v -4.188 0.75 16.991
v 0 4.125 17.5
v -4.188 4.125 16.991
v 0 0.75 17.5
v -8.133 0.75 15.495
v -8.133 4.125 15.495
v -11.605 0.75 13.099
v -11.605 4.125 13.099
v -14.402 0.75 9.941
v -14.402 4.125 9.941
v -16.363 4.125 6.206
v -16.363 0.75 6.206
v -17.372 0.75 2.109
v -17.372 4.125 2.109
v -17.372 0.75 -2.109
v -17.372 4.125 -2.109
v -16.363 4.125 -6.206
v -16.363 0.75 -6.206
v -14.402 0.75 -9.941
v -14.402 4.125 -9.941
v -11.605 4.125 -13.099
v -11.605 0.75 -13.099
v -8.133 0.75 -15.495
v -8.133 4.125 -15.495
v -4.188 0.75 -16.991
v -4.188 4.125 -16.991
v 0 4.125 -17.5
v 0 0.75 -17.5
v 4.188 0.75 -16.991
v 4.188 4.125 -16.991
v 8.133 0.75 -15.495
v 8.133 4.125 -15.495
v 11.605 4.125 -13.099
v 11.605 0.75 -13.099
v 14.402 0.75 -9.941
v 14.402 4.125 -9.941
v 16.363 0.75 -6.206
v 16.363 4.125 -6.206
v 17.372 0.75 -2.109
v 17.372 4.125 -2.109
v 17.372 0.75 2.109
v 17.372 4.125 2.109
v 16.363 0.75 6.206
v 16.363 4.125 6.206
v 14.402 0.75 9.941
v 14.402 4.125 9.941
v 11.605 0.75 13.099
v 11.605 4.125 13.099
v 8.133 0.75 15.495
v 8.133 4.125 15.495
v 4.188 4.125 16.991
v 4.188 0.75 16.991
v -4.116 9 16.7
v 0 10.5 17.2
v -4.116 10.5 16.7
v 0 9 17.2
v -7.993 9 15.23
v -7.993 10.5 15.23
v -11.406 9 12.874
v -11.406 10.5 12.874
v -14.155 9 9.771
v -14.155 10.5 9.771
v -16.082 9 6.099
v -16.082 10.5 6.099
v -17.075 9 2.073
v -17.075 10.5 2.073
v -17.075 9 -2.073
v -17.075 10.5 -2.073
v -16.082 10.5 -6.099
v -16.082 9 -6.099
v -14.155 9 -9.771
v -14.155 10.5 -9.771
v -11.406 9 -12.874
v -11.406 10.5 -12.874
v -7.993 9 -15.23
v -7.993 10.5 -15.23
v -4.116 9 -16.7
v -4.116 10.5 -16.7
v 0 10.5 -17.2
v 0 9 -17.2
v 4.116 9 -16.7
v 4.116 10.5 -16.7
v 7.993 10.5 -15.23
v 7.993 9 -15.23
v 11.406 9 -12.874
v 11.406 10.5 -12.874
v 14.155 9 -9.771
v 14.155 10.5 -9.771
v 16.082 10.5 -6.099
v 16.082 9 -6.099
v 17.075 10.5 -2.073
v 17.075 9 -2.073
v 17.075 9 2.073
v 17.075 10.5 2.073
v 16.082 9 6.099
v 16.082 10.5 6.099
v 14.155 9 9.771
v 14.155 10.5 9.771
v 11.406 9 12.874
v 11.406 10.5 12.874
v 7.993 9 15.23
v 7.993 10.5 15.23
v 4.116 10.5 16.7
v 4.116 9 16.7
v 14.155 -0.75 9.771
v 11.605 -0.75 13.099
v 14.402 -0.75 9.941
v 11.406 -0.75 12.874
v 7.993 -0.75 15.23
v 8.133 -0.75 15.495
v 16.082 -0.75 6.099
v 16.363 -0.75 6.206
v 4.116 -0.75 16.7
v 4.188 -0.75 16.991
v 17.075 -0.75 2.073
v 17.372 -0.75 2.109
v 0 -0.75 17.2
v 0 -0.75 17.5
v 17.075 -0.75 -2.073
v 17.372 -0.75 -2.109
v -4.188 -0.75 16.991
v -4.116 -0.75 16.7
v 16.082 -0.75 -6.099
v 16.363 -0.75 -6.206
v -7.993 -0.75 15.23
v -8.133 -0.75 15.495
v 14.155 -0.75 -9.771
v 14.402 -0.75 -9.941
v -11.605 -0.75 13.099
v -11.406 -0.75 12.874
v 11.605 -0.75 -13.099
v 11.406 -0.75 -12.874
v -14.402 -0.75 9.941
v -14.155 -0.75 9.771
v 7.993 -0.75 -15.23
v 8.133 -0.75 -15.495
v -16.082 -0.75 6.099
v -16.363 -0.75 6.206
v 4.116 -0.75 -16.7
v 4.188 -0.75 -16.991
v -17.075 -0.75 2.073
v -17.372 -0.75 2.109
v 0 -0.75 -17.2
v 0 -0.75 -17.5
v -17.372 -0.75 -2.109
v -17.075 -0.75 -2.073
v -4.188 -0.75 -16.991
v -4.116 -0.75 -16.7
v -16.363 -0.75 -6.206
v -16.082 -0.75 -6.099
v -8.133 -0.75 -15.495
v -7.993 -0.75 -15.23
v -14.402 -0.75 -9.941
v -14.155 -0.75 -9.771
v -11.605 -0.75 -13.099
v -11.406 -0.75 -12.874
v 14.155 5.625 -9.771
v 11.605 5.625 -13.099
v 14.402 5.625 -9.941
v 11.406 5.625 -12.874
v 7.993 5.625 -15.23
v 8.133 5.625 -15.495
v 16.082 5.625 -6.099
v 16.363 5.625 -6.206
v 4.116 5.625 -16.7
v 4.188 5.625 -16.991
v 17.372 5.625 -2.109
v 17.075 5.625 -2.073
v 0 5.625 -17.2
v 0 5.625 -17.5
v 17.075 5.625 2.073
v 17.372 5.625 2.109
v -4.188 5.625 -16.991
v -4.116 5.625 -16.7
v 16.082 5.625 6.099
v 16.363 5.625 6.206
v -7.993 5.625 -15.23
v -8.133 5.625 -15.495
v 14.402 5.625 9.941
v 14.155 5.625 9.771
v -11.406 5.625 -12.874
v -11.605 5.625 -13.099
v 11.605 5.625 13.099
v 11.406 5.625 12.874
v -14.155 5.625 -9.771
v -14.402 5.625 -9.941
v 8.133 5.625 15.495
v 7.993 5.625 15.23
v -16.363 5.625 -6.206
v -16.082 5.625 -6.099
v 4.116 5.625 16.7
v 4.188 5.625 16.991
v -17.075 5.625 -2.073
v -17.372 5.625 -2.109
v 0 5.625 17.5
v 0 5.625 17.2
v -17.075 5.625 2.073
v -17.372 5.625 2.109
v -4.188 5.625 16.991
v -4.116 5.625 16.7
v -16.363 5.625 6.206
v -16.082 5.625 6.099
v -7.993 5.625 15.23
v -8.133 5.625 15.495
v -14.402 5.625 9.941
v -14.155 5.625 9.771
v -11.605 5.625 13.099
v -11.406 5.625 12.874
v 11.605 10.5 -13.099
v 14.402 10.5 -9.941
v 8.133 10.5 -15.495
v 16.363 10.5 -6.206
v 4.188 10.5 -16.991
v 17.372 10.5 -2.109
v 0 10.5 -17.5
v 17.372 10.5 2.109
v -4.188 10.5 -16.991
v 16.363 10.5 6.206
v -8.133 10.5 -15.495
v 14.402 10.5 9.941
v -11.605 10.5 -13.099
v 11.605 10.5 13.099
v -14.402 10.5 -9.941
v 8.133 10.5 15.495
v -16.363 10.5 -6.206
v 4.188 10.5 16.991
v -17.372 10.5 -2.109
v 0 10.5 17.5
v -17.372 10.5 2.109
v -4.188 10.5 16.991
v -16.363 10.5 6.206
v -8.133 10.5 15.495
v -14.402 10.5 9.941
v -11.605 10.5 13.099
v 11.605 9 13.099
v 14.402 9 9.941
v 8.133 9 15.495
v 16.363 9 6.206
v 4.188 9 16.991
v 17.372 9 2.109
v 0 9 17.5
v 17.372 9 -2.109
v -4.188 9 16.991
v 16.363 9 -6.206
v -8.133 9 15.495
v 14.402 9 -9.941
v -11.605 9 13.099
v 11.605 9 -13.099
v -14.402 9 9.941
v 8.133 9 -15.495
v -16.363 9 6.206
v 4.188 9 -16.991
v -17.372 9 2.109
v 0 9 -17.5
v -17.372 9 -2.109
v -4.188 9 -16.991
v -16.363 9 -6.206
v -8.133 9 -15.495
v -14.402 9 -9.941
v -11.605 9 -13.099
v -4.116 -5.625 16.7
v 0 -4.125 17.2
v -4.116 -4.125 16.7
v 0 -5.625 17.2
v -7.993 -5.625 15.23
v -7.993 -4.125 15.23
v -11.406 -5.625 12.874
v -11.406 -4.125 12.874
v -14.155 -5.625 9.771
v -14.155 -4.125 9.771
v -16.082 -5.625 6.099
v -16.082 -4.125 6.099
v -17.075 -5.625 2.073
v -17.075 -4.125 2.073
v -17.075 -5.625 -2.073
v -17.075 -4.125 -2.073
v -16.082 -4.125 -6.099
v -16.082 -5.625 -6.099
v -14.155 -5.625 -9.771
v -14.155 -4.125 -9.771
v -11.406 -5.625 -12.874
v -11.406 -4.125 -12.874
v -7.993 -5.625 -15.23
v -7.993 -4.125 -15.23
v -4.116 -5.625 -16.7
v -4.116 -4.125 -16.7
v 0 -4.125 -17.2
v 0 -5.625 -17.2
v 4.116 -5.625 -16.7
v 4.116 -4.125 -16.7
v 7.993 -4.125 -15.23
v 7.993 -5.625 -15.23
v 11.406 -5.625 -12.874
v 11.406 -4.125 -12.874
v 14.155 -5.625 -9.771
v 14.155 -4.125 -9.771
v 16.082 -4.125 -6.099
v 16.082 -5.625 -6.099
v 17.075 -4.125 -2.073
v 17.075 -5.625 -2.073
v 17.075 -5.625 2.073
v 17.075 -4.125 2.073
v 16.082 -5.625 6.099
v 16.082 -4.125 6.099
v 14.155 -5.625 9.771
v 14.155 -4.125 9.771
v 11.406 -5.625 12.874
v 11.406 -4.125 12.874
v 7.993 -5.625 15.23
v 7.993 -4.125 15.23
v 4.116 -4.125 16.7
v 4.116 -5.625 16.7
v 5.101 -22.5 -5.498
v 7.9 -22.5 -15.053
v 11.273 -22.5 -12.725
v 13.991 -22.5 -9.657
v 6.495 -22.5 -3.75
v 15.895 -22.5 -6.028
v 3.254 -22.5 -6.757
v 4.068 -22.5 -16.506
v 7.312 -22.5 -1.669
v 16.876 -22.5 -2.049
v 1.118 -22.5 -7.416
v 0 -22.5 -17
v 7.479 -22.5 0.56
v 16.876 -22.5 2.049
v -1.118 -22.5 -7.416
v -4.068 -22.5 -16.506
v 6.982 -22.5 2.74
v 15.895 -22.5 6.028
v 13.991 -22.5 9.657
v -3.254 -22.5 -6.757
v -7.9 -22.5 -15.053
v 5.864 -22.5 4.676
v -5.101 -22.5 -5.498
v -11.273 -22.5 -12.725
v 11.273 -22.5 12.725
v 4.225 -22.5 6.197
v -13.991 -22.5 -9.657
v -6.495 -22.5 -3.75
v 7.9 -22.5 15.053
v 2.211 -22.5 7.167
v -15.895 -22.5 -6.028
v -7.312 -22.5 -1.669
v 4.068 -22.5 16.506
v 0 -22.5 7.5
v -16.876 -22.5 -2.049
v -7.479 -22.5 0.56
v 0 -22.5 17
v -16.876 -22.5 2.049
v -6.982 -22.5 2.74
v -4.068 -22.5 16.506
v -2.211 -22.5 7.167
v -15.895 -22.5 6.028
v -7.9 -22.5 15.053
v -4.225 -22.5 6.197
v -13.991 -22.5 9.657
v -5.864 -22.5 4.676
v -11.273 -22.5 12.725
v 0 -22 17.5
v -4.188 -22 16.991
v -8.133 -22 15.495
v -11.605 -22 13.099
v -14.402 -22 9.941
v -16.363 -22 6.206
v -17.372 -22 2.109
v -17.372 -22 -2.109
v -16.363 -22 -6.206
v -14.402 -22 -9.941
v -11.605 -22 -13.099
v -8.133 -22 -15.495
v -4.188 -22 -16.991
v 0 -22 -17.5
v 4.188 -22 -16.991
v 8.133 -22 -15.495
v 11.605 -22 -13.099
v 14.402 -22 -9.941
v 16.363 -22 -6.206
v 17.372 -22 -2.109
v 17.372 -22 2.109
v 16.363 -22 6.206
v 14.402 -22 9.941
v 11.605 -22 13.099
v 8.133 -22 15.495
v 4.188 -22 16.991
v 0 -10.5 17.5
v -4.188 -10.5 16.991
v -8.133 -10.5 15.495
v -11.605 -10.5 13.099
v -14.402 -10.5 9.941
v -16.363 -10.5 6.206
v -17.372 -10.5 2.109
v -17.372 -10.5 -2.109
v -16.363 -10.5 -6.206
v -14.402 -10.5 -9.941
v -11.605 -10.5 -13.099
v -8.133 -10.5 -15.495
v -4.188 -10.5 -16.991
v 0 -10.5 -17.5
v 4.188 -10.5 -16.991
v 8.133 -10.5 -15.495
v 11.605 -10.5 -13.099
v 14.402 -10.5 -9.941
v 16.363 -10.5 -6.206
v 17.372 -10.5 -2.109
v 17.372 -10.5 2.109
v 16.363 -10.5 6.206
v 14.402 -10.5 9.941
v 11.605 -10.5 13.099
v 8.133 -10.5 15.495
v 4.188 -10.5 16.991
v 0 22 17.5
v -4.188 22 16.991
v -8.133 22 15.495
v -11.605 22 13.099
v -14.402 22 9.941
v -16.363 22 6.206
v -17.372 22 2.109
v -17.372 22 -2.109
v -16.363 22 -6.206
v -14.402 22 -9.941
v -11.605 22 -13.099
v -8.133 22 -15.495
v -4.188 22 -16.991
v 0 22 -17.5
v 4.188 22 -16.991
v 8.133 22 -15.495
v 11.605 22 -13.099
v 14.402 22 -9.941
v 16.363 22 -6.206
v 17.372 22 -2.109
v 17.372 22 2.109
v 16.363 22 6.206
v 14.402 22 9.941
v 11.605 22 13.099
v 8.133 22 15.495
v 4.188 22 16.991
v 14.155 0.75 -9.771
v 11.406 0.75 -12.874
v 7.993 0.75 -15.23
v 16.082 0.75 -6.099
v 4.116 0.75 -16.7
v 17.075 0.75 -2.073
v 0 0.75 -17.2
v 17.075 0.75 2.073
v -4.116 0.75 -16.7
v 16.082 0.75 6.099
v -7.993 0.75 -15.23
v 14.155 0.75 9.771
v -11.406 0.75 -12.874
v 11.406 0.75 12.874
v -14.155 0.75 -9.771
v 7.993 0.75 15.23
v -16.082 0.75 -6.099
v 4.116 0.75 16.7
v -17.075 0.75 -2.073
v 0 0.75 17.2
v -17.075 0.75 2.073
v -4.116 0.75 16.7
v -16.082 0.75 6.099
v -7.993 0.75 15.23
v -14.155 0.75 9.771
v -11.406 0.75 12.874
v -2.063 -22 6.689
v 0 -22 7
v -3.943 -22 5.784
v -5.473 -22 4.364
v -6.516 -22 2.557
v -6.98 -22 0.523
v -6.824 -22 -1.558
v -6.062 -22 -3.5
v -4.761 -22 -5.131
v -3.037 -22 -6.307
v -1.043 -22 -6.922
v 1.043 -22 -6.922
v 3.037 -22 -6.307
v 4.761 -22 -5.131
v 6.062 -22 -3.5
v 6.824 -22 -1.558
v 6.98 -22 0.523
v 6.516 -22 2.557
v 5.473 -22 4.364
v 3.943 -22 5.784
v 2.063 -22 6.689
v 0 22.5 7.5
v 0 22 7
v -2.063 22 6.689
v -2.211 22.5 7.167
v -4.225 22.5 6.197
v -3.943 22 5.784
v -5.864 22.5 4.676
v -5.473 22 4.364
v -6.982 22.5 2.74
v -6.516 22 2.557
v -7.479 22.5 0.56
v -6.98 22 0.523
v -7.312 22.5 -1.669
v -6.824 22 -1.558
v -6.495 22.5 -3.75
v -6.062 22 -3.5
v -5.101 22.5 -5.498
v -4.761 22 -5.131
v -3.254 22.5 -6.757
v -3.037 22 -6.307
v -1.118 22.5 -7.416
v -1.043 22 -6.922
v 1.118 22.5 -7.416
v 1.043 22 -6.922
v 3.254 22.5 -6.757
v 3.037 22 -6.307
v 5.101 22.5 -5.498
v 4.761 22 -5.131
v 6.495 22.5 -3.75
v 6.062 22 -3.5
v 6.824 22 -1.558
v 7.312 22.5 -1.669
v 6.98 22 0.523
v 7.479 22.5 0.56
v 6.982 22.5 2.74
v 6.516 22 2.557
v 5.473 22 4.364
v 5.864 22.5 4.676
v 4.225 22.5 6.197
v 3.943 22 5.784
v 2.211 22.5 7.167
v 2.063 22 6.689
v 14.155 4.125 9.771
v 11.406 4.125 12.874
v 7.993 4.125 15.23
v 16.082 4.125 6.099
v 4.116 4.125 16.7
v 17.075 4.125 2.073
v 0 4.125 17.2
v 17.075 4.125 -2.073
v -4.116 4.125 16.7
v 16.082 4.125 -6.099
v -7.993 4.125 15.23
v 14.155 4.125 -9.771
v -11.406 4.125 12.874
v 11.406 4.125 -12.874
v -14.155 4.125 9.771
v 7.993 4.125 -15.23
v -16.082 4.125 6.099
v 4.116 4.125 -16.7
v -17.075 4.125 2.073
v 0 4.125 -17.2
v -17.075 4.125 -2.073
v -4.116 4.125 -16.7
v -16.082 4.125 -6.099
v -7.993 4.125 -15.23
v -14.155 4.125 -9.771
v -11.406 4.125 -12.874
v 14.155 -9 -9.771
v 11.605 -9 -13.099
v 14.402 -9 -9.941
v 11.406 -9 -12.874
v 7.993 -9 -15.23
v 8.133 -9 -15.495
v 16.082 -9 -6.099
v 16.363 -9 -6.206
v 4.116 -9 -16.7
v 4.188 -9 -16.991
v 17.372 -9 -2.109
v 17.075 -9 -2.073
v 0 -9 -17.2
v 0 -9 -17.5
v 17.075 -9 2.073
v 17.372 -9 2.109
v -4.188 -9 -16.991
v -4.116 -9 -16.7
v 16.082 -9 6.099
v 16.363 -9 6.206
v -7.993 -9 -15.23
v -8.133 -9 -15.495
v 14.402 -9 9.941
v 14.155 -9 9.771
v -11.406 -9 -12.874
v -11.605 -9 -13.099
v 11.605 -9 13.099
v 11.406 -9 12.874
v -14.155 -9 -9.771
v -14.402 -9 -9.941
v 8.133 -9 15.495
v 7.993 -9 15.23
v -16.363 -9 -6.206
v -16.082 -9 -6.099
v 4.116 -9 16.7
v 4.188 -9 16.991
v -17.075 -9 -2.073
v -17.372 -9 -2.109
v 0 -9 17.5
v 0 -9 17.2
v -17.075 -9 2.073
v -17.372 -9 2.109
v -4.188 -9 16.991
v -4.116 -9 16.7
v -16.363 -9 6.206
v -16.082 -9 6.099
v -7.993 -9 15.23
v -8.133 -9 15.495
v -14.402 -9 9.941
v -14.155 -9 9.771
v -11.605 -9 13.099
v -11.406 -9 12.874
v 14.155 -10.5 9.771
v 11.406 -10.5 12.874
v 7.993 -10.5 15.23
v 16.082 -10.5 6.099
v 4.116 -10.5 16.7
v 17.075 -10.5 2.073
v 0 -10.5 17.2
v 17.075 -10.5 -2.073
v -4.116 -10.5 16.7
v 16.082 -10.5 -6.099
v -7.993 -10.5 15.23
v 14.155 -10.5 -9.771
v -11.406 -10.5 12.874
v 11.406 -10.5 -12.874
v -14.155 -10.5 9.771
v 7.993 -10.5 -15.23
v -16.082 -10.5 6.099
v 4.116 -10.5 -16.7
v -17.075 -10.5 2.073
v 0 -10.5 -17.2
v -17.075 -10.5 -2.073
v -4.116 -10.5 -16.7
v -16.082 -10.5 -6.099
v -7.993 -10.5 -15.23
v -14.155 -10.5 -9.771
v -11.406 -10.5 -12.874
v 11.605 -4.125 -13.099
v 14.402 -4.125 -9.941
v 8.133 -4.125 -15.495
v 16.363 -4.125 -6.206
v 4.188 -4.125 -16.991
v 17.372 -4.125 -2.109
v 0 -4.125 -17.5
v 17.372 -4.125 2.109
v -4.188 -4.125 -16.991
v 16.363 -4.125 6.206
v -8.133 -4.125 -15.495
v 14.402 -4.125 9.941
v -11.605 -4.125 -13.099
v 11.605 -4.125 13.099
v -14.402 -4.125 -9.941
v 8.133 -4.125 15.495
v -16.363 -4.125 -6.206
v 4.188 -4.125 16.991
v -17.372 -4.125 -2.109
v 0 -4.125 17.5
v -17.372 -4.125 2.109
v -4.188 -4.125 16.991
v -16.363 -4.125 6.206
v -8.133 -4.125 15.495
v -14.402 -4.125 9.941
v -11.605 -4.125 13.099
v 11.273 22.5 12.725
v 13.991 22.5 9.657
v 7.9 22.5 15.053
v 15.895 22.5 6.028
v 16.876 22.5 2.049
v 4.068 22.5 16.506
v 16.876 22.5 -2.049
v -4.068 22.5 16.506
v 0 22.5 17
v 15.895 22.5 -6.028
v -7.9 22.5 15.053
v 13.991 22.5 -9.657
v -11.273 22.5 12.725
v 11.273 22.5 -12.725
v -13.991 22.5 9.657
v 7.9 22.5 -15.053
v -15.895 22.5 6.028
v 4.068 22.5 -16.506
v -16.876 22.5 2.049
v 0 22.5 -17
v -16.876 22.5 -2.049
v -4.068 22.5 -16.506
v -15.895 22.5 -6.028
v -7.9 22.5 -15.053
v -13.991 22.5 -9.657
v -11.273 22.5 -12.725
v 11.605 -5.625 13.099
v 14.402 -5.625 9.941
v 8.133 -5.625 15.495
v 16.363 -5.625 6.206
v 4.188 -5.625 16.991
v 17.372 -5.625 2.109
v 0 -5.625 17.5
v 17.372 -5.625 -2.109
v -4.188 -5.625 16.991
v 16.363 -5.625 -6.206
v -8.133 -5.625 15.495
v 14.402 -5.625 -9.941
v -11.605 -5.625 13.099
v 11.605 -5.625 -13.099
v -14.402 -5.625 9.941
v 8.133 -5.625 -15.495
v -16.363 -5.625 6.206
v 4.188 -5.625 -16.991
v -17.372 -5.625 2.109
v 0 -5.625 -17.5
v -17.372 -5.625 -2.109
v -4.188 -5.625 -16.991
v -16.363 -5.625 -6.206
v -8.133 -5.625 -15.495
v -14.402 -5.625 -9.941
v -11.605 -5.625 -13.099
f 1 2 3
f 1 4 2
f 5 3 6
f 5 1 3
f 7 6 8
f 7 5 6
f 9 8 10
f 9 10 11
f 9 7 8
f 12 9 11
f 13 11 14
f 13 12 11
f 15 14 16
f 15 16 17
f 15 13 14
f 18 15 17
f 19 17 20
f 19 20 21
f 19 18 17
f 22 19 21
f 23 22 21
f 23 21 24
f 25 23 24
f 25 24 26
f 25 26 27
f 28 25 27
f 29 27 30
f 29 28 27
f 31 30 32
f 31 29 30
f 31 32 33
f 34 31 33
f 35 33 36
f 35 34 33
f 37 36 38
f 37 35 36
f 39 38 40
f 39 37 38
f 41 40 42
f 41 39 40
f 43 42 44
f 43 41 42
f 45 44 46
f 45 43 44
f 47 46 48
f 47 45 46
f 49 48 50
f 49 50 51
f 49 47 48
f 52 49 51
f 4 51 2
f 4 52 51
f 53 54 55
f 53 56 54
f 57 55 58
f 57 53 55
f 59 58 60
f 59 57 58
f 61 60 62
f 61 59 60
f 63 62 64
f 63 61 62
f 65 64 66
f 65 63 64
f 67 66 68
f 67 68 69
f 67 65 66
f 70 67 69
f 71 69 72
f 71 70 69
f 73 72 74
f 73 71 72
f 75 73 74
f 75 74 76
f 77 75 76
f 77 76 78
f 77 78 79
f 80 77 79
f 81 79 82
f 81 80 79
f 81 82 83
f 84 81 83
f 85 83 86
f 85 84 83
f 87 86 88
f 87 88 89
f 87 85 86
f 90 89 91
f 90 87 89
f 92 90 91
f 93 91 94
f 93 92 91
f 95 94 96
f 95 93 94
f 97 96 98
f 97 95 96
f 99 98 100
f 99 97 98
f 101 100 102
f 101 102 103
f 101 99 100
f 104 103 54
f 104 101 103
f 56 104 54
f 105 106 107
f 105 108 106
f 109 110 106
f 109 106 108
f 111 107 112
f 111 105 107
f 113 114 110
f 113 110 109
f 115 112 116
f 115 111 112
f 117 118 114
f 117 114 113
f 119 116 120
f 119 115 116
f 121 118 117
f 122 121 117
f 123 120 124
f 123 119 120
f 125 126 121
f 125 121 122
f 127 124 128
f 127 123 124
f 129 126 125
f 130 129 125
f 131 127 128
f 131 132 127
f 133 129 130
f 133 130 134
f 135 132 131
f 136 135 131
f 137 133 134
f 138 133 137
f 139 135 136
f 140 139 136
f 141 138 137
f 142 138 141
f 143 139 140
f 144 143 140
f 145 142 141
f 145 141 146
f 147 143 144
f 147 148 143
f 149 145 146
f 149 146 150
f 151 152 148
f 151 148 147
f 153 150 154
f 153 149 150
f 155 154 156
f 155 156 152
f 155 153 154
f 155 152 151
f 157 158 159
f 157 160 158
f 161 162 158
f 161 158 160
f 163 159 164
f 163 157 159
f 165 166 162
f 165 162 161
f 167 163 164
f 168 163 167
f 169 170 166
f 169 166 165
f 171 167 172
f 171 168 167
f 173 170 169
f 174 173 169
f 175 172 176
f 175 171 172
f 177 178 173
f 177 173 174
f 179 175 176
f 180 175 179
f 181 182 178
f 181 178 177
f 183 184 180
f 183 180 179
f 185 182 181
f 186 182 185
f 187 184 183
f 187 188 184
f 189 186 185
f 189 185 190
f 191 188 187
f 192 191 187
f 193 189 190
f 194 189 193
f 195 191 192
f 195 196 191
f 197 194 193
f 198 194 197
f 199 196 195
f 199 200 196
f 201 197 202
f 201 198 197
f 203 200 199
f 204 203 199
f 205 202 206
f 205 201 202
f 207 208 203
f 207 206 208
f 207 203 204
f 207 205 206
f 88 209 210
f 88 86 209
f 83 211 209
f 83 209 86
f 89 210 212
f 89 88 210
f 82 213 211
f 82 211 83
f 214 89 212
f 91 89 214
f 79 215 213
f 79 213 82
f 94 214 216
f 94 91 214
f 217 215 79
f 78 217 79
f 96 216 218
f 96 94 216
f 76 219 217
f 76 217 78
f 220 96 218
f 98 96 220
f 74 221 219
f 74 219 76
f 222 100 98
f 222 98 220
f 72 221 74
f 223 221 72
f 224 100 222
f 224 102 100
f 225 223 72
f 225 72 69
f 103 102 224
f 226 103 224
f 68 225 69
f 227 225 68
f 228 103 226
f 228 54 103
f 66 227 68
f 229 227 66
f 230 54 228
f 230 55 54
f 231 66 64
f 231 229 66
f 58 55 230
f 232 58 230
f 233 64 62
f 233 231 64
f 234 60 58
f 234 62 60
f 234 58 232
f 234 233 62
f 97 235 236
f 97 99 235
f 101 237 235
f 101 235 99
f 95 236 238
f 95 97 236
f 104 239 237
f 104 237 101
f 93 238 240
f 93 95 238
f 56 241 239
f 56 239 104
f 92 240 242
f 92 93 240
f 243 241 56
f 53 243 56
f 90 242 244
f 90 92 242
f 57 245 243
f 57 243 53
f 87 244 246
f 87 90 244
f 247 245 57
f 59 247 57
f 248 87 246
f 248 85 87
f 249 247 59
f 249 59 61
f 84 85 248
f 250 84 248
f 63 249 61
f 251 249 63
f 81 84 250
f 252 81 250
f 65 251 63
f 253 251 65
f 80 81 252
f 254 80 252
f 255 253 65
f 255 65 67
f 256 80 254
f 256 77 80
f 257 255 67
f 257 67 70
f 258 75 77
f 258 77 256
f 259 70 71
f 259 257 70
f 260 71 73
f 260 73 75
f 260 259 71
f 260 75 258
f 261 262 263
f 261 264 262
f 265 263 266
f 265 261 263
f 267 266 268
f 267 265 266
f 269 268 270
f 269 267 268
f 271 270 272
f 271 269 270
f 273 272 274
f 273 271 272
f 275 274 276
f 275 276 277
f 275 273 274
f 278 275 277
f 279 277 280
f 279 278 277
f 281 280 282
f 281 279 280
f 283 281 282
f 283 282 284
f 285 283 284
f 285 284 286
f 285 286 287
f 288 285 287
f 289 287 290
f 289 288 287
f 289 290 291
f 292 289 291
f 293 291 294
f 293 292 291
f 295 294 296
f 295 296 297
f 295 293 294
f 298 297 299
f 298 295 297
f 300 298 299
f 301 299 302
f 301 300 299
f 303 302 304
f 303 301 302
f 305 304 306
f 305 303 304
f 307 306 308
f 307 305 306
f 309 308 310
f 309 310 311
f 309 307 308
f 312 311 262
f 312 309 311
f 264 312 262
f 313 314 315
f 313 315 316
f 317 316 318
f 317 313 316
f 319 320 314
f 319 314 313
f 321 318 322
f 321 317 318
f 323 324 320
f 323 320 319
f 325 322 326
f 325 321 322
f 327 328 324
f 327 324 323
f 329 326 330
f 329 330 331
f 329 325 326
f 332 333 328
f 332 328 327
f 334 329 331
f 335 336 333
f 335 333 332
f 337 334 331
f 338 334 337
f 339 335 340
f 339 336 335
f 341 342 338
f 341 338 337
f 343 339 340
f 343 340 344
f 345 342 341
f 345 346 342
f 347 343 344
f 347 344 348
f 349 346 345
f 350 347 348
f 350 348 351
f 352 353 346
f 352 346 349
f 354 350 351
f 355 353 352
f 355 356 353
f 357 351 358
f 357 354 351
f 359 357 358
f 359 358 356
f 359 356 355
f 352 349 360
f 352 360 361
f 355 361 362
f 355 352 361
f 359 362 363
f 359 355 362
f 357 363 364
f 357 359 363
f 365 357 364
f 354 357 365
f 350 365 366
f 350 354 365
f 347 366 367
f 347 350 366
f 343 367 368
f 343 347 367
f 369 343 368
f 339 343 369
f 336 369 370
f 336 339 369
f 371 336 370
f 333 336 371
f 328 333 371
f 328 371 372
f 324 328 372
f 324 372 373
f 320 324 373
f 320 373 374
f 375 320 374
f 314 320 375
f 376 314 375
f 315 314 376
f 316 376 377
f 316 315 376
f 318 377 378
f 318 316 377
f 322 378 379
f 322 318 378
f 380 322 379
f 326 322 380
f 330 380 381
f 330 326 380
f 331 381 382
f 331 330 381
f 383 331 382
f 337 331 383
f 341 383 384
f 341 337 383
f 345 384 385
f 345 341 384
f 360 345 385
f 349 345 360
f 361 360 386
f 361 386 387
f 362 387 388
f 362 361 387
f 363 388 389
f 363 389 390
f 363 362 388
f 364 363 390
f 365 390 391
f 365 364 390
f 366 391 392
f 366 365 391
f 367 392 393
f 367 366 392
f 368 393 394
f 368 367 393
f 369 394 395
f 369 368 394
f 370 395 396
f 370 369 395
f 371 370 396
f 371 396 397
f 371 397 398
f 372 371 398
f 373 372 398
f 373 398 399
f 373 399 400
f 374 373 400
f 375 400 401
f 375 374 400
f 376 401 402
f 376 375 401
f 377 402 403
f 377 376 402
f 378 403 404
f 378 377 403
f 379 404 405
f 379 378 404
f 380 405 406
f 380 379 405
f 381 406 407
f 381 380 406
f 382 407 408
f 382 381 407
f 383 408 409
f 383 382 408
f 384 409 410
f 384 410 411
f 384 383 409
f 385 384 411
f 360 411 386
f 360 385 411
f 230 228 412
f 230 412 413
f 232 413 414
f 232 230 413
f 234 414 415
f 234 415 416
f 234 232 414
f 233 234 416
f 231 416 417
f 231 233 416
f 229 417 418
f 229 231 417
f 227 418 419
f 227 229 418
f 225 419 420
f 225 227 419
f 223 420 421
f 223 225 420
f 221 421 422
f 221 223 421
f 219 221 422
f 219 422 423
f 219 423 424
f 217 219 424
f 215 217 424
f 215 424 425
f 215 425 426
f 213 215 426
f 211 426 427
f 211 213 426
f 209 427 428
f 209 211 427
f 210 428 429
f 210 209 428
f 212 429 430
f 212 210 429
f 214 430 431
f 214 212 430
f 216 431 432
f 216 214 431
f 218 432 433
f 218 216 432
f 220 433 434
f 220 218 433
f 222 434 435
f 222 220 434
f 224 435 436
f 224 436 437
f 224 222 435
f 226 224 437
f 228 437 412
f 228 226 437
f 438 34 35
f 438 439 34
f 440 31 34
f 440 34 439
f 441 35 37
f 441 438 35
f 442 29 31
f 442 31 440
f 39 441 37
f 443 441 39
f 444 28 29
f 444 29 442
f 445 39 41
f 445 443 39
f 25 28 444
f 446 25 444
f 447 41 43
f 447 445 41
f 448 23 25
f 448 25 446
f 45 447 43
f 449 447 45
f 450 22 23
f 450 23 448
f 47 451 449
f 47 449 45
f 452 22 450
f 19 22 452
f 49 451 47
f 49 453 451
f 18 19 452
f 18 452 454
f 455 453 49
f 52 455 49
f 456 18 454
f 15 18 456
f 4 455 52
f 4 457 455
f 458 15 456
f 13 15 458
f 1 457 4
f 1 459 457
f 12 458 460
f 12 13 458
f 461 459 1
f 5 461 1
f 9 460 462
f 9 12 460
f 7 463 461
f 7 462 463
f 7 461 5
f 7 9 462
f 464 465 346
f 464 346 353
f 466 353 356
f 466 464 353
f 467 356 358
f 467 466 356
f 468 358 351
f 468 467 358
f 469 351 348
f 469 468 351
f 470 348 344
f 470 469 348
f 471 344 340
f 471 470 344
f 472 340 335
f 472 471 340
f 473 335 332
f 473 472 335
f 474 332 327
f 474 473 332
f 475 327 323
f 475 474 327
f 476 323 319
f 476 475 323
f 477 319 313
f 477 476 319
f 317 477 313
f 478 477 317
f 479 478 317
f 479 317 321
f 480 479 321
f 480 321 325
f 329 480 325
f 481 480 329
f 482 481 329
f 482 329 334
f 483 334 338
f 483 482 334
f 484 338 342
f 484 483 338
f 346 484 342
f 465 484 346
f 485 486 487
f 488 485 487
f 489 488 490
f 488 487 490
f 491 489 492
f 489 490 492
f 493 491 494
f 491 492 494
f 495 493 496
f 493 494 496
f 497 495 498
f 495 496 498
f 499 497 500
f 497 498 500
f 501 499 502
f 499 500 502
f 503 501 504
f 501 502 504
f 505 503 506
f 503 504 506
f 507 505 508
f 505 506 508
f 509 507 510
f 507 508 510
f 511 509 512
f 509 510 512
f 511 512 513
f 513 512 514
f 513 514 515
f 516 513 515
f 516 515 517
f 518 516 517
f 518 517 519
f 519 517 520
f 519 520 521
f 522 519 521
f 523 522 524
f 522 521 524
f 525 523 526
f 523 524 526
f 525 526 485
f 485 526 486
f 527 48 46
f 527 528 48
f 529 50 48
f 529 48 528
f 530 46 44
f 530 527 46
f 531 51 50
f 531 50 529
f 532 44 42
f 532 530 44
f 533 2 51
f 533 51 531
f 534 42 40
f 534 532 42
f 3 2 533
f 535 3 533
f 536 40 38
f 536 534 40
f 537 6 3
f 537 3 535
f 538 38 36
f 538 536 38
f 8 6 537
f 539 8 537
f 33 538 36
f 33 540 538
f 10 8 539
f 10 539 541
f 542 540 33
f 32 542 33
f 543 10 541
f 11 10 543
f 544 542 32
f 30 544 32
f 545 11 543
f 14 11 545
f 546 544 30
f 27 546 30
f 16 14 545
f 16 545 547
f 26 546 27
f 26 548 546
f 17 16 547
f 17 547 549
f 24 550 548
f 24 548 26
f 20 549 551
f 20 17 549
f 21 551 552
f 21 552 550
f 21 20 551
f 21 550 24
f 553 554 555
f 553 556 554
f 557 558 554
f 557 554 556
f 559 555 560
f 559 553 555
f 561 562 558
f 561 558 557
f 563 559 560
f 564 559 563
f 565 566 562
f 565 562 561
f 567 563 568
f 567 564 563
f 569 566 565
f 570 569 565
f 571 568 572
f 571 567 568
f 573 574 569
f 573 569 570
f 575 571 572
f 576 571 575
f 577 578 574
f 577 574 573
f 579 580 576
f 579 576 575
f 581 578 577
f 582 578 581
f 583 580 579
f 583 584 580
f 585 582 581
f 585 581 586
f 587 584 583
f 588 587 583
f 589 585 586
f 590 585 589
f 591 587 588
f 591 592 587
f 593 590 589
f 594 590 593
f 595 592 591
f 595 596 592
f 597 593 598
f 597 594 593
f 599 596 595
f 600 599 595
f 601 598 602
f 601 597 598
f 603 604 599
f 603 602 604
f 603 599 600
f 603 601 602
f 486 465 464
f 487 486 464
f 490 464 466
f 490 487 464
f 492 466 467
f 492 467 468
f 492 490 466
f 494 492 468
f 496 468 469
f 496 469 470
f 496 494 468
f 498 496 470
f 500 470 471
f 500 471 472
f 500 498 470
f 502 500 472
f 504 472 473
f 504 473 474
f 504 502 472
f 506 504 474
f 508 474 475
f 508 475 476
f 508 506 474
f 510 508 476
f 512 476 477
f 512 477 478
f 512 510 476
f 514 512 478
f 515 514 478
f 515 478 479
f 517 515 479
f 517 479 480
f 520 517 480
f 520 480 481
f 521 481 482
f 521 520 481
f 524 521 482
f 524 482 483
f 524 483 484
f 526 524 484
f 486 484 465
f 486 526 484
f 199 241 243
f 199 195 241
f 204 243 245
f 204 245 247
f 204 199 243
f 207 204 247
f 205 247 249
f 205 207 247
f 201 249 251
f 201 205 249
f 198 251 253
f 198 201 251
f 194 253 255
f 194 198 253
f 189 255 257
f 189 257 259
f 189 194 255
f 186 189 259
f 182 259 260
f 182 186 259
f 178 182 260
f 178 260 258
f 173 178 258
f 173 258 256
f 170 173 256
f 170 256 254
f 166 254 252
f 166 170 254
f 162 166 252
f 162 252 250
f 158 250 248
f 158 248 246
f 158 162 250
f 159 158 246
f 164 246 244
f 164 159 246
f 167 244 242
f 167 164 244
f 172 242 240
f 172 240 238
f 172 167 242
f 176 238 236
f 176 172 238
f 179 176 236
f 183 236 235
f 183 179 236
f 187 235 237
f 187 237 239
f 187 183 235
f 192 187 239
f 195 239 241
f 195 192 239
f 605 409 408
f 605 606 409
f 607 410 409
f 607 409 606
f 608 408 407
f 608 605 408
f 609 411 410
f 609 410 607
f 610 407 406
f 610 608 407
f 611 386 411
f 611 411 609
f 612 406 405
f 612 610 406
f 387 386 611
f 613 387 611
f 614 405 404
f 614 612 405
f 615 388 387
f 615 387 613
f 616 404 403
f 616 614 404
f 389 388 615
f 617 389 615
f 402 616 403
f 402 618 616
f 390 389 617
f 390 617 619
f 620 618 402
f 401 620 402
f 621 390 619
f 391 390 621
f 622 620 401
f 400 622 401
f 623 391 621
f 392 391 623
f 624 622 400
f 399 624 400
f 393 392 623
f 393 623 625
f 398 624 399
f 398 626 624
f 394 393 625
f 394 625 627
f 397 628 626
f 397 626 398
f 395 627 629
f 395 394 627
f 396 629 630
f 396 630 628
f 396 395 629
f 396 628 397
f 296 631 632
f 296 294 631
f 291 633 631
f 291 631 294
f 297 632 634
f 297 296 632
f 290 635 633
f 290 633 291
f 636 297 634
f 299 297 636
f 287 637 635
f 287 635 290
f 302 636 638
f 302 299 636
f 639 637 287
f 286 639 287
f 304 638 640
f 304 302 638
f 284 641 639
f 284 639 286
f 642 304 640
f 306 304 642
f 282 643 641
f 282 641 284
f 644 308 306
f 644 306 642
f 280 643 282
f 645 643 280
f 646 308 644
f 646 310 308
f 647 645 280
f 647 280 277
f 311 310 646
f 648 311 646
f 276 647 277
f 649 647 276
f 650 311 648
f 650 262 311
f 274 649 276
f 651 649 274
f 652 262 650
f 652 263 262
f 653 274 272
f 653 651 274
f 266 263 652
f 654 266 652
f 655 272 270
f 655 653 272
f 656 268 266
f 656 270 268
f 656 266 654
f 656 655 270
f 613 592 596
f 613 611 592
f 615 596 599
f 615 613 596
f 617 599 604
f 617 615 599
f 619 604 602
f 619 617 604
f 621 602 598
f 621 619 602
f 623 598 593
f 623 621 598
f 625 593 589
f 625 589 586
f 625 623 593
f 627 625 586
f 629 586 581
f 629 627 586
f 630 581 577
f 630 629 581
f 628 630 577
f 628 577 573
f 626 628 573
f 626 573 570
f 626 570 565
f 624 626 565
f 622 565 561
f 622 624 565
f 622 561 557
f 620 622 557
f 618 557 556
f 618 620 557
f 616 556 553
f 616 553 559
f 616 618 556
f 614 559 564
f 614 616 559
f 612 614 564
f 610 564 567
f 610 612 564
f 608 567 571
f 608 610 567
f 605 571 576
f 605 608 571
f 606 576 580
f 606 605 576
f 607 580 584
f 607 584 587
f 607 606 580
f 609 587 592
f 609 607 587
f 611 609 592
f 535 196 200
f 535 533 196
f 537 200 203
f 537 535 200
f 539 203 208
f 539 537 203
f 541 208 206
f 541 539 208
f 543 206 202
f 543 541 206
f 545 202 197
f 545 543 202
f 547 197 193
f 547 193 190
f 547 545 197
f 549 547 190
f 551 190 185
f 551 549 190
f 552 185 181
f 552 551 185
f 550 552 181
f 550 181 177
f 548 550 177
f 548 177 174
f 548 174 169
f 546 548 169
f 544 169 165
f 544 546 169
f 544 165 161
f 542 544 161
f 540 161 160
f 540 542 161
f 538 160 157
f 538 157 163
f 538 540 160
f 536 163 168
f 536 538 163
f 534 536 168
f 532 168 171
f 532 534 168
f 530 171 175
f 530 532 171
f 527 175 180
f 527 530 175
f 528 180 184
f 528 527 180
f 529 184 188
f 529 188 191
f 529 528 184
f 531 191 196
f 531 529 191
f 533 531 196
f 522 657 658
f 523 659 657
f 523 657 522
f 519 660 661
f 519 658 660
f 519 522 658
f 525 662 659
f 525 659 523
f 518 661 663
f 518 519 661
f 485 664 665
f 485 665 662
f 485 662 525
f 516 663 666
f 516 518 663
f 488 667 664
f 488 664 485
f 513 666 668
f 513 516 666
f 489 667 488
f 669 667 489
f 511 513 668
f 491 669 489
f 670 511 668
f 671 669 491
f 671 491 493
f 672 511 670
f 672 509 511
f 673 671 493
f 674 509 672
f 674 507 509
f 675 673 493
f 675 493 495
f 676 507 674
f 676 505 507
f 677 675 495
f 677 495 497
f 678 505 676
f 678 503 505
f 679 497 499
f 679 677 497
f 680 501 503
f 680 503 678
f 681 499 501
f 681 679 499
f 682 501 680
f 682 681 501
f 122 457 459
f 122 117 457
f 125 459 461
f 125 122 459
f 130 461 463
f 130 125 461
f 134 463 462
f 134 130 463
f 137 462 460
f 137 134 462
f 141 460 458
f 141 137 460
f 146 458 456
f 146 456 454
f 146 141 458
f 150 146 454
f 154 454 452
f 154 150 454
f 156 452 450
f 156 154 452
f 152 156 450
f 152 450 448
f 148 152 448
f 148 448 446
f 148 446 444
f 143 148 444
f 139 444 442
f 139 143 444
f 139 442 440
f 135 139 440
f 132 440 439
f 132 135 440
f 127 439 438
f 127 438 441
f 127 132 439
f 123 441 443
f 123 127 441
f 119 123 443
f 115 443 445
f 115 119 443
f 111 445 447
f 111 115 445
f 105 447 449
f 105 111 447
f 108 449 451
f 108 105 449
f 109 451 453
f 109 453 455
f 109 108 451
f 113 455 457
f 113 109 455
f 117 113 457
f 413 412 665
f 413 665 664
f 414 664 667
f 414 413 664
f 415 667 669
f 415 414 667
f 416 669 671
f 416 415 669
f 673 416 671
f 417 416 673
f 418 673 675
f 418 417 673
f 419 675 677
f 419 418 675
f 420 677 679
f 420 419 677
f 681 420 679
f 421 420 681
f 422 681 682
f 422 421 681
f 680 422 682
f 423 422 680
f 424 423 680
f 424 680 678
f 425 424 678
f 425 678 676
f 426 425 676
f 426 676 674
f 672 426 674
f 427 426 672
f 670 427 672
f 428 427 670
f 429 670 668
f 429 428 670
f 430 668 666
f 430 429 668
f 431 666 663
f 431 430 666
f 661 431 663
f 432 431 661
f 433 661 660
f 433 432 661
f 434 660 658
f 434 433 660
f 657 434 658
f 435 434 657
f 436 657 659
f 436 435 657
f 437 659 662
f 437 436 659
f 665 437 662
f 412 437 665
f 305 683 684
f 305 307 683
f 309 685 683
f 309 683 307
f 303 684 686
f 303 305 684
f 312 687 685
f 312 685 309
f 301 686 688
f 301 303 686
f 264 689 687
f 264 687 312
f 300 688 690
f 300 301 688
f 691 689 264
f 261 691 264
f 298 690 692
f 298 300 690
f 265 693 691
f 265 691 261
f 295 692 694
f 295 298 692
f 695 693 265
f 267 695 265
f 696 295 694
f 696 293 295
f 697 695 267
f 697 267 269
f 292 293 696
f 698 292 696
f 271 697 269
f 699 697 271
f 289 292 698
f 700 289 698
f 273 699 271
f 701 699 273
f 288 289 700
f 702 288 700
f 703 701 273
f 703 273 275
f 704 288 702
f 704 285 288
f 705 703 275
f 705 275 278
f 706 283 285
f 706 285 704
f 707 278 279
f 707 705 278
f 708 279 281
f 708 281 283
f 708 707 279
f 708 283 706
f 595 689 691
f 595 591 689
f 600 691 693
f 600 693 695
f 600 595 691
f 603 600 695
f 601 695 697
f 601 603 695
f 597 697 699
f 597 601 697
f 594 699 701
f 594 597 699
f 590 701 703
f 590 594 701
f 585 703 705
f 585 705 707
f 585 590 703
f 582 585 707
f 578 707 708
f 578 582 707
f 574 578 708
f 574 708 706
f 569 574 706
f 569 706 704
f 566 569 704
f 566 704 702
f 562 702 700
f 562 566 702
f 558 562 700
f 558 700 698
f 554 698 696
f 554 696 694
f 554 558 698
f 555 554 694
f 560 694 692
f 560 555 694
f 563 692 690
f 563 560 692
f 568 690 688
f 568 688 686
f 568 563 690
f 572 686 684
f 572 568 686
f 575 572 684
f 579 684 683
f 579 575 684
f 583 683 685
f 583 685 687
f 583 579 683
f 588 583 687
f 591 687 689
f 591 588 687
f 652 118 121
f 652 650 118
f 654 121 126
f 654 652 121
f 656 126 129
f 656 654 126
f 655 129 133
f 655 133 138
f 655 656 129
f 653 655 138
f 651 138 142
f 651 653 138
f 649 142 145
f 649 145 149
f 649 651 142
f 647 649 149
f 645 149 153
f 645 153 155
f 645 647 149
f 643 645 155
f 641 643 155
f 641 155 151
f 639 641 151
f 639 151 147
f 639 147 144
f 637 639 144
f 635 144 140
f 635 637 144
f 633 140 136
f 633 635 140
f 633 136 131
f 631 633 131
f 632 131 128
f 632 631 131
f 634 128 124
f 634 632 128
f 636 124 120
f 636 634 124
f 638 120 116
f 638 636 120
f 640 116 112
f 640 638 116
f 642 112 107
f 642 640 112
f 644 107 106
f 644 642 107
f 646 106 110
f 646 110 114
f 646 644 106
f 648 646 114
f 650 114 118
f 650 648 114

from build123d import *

# Parameters (mm, degrees)
CHAMFER_1_SIZE = 0.5


with BuildPart() as part:
    # Эскиз1 → Повернуть1 (revolve)
    with BuildSketch(Plane.XY):
        Polygon((7, 22.5), (17.5, 22.5), (17.5, 10.5), (17.2, 10.5), (17.2, 9), (17.5, 9), (17.5, 5.625), (17.2, 5.625), (17.2, 4.125), (17.5, 4.125), (17.5, 0.75), (17.2, 0.75), (17.2, -0.75), (17.5, -0.75), (17.5, -4.125), (17.2, -4.125), (17.2, -5.625), (17.5, -5.625), (17.5, -9), (17.2, -9), (17.2, -10.5), (17.5, -10.5), (17.5, -22.5), (7, -22.5), align=None)
    revolve(axis=Axis((0, 53.65103478, 0), (0, -1, 0)))

    # Фаска1
    chamfer_1_edges = [part.edges().sort_by_distance(p)[0] for p in [
        (-7, -22.5, 0),
        (-17.5, -22.5, 0),
        (-7, 22.5, 0),
        (-17.5, 22.5, 0),
    ]]
    chamfer(chamfer_1_edges, length=CHAMFER_1_SIZE)


solid = part.part
